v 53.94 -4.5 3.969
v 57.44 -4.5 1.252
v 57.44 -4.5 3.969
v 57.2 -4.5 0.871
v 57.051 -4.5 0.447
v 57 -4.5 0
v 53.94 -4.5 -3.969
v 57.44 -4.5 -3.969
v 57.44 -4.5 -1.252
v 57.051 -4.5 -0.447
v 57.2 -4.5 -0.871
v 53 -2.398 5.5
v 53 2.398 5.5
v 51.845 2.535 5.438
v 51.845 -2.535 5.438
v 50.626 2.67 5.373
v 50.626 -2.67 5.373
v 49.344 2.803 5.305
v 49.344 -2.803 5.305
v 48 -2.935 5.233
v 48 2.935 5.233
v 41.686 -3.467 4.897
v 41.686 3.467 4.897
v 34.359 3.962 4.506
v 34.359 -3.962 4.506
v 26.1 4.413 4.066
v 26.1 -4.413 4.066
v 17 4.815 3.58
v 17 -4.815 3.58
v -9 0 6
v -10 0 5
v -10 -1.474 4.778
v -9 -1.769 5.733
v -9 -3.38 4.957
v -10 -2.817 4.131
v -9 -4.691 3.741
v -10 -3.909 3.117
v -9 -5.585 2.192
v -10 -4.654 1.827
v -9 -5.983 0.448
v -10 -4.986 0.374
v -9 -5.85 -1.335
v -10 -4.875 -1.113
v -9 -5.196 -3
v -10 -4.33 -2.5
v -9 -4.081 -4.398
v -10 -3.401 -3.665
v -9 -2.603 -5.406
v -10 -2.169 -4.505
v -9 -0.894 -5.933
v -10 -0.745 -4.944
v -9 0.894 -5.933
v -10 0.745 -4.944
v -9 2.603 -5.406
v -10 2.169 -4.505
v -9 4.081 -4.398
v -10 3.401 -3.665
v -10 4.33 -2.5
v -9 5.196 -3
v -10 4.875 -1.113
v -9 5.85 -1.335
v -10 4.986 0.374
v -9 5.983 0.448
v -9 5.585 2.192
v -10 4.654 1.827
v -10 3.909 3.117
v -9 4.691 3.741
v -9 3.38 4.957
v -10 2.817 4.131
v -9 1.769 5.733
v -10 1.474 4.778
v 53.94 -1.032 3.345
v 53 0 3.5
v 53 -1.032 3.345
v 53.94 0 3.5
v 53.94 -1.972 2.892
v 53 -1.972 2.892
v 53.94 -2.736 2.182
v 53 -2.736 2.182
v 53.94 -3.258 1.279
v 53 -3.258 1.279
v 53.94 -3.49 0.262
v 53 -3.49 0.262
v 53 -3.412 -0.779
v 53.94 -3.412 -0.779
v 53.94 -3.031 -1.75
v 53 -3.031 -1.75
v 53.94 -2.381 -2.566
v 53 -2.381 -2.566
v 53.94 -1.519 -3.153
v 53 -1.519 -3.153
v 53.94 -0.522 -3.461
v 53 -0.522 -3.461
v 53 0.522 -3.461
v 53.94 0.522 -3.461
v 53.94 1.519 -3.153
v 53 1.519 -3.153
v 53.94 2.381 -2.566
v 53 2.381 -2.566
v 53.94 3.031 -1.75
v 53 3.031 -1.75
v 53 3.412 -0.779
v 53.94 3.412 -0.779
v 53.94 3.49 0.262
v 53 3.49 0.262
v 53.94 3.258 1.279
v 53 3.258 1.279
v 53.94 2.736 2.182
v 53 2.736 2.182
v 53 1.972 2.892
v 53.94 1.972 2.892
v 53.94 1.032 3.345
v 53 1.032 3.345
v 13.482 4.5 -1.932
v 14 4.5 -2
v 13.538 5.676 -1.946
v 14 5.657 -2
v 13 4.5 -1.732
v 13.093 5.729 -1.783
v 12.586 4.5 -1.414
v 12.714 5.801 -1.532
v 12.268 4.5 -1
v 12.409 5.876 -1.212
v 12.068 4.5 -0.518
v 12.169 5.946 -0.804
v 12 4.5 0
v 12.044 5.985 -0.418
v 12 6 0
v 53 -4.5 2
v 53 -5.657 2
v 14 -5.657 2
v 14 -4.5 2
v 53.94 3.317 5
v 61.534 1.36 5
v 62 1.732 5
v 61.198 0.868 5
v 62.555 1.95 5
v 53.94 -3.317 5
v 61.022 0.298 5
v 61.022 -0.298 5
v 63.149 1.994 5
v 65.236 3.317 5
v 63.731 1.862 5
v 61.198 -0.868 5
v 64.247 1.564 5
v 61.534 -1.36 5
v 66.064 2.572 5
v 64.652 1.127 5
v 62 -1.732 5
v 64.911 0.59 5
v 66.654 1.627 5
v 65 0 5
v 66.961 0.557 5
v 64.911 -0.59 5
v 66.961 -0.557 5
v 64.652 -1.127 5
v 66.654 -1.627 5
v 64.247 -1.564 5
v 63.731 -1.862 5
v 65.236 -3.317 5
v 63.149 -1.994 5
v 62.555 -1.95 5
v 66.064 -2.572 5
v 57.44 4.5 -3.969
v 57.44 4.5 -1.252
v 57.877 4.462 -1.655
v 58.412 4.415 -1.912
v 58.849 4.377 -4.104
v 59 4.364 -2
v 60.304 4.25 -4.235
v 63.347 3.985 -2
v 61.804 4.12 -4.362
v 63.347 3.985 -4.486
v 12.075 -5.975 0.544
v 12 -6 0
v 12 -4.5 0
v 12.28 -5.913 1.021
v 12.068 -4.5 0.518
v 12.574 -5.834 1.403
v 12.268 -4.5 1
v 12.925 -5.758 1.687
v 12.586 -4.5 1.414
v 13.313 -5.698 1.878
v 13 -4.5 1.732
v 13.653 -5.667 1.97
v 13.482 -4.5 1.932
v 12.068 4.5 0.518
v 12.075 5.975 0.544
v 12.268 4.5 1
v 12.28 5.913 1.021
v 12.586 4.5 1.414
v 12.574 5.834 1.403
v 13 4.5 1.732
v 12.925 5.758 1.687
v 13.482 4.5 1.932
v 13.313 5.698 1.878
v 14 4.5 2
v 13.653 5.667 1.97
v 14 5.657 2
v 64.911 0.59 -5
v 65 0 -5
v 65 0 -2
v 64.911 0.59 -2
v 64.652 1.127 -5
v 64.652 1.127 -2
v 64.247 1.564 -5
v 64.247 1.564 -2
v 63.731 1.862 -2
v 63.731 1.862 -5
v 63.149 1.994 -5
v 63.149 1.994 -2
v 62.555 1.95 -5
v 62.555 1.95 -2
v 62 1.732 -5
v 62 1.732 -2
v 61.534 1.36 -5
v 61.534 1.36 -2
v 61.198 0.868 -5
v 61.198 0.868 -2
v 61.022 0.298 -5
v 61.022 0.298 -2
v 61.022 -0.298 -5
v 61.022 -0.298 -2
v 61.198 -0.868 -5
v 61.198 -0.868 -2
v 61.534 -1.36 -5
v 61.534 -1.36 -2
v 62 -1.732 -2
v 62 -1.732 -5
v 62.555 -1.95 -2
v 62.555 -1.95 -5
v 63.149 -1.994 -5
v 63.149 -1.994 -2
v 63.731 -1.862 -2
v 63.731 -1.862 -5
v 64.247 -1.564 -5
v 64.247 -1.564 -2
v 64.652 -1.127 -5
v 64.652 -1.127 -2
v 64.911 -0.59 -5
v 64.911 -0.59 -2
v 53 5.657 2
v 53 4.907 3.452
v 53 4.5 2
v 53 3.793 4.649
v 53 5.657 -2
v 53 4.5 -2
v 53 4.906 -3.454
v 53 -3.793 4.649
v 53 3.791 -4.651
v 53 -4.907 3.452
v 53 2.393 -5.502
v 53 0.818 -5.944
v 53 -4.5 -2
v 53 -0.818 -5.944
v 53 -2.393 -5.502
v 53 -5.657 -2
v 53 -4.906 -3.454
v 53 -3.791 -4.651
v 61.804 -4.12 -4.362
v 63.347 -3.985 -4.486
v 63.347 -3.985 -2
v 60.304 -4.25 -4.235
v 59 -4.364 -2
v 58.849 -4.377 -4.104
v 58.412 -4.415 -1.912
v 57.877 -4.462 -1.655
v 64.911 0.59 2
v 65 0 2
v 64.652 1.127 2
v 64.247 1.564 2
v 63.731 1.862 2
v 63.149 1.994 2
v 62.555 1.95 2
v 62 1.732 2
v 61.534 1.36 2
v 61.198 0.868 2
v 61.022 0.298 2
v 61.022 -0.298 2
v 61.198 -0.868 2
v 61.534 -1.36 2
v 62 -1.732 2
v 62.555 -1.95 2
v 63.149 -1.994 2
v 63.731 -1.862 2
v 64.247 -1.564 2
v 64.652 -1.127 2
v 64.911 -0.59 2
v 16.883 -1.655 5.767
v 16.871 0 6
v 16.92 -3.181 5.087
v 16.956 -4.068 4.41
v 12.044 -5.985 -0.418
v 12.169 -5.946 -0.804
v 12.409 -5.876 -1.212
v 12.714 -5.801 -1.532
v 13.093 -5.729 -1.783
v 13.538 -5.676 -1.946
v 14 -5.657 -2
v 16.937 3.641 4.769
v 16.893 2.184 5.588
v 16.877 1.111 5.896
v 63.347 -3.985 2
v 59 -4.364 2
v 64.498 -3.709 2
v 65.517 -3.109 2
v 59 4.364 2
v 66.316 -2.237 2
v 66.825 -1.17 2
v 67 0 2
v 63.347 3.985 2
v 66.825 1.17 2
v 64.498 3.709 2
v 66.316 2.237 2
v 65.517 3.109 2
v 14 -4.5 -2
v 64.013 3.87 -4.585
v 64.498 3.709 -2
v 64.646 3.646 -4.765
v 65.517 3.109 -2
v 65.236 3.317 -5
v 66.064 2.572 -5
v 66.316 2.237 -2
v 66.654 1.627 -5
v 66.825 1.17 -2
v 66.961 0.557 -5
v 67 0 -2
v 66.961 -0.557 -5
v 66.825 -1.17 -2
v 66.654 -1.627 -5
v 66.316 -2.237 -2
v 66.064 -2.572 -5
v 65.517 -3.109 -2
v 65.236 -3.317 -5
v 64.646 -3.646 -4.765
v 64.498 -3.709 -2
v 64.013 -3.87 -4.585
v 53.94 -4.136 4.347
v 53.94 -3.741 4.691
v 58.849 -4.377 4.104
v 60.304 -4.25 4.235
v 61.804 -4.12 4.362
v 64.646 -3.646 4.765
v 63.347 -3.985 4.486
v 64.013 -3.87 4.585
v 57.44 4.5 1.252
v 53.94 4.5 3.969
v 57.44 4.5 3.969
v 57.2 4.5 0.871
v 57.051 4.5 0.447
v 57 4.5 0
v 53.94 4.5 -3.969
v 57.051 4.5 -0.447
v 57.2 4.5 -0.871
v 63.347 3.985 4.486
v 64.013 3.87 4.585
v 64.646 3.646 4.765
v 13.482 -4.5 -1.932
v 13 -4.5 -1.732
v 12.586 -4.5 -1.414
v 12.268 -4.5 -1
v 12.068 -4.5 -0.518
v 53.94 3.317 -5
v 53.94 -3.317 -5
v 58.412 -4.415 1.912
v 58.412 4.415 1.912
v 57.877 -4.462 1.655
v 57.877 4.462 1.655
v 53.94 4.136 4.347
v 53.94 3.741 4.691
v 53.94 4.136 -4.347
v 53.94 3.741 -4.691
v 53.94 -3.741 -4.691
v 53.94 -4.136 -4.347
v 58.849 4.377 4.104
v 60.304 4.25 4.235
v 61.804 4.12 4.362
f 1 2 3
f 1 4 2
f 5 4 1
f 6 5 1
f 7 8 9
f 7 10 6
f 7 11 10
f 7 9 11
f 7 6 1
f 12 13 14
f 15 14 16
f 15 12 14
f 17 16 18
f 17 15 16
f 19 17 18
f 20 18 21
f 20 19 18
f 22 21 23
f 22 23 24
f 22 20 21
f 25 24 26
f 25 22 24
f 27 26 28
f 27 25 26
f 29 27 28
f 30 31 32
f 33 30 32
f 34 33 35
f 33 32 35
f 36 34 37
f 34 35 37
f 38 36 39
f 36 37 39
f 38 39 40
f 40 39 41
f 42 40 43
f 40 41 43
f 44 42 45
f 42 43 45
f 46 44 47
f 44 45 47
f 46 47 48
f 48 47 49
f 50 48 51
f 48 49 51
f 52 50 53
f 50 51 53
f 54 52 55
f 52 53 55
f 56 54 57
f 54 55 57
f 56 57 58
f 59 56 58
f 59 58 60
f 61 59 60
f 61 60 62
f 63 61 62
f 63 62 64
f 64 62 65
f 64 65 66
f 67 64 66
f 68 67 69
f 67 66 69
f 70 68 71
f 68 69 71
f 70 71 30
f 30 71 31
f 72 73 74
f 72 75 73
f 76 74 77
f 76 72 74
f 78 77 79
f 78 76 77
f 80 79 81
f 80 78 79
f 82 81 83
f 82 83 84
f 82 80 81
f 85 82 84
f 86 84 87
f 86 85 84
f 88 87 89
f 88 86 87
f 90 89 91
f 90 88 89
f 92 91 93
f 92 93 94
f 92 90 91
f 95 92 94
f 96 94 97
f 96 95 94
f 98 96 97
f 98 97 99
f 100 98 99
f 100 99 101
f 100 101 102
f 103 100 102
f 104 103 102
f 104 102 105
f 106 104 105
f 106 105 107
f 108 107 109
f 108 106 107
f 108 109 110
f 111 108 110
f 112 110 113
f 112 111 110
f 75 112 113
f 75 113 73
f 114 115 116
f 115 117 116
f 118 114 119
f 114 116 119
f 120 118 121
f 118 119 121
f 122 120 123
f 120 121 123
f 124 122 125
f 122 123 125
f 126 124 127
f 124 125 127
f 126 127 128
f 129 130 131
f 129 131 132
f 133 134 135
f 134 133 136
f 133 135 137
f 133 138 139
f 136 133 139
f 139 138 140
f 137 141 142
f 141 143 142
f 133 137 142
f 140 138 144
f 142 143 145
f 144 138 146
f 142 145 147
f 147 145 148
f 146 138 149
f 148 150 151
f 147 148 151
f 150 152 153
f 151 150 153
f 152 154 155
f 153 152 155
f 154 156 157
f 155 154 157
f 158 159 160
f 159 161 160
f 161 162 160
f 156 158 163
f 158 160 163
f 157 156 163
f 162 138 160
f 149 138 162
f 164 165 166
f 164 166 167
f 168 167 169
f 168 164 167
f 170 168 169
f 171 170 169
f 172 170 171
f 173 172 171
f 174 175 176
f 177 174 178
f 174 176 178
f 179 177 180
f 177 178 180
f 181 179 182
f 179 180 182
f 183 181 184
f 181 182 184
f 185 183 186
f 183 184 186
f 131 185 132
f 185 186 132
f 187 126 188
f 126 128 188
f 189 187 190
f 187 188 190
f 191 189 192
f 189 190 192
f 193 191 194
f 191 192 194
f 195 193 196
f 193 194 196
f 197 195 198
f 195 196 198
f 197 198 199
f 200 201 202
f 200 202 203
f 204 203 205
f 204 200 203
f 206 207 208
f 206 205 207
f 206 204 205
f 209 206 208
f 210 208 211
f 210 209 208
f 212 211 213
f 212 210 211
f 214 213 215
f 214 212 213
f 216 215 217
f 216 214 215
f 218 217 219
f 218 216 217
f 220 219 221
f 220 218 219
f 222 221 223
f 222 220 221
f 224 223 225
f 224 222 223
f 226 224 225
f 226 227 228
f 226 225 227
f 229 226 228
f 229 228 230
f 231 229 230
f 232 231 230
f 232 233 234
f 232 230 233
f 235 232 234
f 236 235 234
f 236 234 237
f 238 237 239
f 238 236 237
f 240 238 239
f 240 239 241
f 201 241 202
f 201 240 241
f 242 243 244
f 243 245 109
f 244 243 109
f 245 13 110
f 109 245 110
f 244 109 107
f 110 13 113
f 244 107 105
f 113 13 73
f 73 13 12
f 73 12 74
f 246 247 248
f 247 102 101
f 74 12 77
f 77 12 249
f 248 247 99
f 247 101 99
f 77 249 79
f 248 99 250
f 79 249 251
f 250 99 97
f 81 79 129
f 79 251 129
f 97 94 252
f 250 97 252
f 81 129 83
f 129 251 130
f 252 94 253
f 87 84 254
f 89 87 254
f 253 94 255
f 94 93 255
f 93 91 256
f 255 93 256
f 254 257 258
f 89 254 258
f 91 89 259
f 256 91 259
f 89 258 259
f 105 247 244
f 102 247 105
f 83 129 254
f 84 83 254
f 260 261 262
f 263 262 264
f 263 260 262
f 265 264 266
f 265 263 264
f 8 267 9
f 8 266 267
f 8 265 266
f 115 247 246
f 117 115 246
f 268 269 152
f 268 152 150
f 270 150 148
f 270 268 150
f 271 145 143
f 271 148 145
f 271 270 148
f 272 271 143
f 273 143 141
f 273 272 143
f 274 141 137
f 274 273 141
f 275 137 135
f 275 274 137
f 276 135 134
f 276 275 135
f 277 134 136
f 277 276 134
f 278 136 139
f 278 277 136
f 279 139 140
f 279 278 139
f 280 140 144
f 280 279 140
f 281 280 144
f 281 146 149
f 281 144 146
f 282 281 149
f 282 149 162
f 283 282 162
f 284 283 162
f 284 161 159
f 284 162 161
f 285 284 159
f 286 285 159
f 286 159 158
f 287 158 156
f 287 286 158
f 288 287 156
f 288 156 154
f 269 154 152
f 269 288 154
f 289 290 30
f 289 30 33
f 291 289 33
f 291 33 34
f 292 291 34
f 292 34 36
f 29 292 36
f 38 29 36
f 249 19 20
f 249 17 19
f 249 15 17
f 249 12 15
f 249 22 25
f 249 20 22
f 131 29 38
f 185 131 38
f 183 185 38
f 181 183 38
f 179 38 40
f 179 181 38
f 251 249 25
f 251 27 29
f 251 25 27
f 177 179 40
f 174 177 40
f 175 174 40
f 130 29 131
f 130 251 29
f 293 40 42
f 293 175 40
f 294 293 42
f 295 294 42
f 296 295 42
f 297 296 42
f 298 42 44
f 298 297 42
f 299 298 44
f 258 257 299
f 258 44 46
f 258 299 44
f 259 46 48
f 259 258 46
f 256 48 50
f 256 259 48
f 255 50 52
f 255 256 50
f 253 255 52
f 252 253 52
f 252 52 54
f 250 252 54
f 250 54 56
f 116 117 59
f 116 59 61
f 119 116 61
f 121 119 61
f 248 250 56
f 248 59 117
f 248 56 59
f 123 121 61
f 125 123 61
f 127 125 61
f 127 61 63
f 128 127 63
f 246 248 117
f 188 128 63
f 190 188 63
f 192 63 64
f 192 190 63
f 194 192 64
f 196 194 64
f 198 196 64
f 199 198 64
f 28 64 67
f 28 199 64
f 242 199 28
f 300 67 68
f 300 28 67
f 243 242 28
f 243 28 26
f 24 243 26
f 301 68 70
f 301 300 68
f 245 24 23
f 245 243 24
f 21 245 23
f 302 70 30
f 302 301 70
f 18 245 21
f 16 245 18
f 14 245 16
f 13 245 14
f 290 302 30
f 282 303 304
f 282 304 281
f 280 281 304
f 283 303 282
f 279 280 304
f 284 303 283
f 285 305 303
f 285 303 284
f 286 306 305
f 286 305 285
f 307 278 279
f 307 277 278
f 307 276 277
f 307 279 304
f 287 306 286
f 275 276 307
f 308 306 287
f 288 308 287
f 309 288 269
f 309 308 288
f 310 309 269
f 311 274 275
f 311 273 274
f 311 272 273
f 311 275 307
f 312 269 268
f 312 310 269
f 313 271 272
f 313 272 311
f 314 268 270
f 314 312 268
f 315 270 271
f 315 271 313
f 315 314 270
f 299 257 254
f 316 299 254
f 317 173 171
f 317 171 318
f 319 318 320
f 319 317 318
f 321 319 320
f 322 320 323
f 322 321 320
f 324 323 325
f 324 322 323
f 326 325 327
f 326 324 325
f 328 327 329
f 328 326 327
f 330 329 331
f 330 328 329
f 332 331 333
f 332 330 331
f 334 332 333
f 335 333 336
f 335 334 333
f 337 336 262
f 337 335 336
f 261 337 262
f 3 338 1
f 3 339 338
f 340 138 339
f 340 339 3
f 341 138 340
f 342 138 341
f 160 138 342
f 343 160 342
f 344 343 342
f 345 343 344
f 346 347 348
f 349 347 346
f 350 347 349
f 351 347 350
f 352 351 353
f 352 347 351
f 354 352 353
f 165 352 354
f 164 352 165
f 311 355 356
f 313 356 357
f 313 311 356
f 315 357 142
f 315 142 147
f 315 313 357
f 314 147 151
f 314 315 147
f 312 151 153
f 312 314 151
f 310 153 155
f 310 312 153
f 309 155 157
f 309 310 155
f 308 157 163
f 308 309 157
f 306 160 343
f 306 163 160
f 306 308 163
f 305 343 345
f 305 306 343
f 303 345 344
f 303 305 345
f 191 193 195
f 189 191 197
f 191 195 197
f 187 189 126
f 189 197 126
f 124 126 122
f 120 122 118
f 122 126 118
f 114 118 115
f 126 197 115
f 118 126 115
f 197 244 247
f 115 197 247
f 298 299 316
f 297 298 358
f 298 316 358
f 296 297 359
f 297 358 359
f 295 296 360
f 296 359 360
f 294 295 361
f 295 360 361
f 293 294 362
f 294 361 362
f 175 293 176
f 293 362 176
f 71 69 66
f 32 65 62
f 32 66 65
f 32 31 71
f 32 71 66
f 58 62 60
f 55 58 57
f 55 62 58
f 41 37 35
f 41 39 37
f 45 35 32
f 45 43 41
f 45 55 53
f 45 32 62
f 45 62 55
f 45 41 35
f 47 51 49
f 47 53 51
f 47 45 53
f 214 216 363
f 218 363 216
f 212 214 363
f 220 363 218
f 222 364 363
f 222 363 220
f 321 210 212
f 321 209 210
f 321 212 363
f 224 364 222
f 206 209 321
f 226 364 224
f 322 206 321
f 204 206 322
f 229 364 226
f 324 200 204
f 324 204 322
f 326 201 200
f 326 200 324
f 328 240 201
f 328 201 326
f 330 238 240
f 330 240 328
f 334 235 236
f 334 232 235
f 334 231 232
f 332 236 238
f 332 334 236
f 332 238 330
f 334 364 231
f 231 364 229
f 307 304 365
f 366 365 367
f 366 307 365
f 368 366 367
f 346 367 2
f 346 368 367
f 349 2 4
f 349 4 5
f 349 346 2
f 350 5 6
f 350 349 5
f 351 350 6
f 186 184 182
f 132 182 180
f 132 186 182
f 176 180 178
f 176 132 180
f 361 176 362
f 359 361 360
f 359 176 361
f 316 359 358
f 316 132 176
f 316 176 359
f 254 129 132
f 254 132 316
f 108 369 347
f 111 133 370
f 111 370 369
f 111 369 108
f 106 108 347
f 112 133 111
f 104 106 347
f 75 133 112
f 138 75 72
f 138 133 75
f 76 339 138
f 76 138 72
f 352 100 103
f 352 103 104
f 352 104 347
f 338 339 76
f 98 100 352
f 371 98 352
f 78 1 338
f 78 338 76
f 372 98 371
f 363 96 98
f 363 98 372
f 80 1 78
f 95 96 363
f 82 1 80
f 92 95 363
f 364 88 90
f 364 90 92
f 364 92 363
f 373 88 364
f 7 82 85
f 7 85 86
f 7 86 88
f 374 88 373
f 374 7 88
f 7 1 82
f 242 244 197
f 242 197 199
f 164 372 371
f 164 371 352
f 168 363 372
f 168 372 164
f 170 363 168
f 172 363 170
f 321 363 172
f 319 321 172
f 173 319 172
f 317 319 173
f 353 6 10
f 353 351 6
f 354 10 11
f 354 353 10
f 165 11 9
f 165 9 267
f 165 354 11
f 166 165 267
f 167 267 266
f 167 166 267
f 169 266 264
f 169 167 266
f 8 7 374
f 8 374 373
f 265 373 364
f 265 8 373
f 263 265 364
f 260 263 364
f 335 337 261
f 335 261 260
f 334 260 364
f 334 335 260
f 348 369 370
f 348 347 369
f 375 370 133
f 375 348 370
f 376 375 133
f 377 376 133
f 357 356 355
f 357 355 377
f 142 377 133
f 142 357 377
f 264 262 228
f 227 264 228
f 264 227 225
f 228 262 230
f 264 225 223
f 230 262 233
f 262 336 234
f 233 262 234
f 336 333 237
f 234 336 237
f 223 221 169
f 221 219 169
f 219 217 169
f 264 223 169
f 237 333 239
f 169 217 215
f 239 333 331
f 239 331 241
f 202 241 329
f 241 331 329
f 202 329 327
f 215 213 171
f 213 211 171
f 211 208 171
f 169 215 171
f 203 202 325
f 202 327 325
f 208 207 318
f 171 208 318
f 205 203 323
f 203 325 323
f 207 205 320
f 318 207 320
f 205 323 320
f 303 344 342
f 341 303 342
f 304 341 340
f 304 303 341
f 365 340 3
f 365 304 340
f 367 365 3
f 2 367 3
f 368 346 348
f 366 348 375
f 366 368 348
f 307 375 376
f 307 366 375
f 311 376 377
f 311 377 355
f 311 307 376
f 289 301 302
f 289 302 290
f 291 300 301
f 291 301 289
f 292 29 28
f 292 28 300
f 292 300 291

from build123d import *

# Parameters (mm, degrees)
SKIZZE1_W                            = 63
SKIZZE1_H                            = 6
SKIZZE2_W                            = 18
SKIZZE2_H                            = 14
AUFSATZ_LINEAR_AUSTRAGEN1_DEPTH      = 9
SCHNITT_LINEAR_AUSTRAGEN1_DEPTH      = 72.909665553
SCHNITT_LINEAR_AUSTRAGEN1_DEPTH_BACK = 72.909665553
SKIZZE3_R                            = 2
SCHNITT_LINEAR_AUSTRAGEN2_DEPTH      = 72.909665553
SCHNITT_LINEAR_AUSTRAGEN2_DEPTH_BACK = 72.909665553
SKIZZE4_W                            = 15
SKIZZE4_H                            = 4
SCHNITT_LINEAR_AUSTRAGEN4_DEPTH      = 72.909665553
SCHNITT_LINEAR_AUSTRAGEN4_DEPTH_BACK = 72.909665553
SCHNITT_LINEAR_AUSTRAGEN5_DEPTH      = 5
SCHNITT_LINEAR_AUSTRAGEN5_DEPTH_BACK = 65.02343321
SKIZZE9_OUTSIDE_W                    = 32.83
SKIZZE9_OUTSIDE_H                    = 36.83
SKIZZE9_OUTSIDE_R                    = 6
SKIZZE11_W                           = 0.94
SKIZZE11_H                           = 2.5
SKIZZE14_W                           = 4
SKIZZE14_H                           = 3
SCHNITT_LINEAR_AUSTRAGEN7_DEPTH      = 45
FASE1_SIZE                           = 1
SCHNITT_LINEAR_START                 = -6.0000001
SCHNITT_LINEAR_AUSTRAGEN8_DEPTH      = 12.0000001
SCHNITT_LINEAR_AUSTRAGEN9_DEPTH      = 68.535176128
SCHNITT_LINEAR_AUSTRAGEN9_DEPTH_BACK = 68.535176128
SKIZZE16_W                           = 13.06
SKIZZE16_H                           = 1
VERRUNDUNG2_R                        = 2
VERRUNDUNG3_R                        = 2
VERRUNDUNG4_R                        = 2


with BuildPart() as part:
    # Skizze1 → Rotation1 (revolve)
    with BuildSketch(Plane.XY, mode=Mode.PRIVATE) as rotation1_sk:
        with Locations((21.5, 3)):
            Rectangle(SKIZZE1_W, SKIZZE1_H)
    revolve(rotation1_sk.sketch.rotate(Axis((0, 0, 0), (1, 0, 0)), 90), axis=Axis((0, 0, 0), (1, 0, 0)))

    # Skizze2 → Aufsatz-Linear austragen1 (add, symmetric)
    with BuildSketch(Plane(origin=(0, 0, 0), x_dir=(1, 0, 0), z_dir=(0, 1, 0))):
        with Locations((62, 0)):
            Rectangle(SKIZZE2_W, SKIZZE2_H)
    extrude(amount=AUFSATZ_LINEAR_AUSTRAGEN1_DEPTH, both=True)

    # Skizze3 → Schnitt-Linear austragen1 (cut, two sides: drawn at the far end of the back side and taken through both)
    with BuildSketch(Plane.XY.offset(-SCHNITT_LINEAR_AUSTRAGEN1_DEPTH_BACK)):
        with Locations((63, 0)):
            Circle(SKIZZE3_R)
    extrude(amount=SCHNITT_LINEAR_AUSTRAGEN1_DEPTH + SCHNITT_LINEAR_AUSTRAGEN1_DEPTH_BACK, mode=Mode.SUBTRACT)

    # Skizze4 → Schnitt-Linear austragen2 (cut, two sides: drawn at the far end of the back side and taken through both)
    with BuildSketch(Plane(origin=(0, 0, 0), x_dir=(1, 0, 0), z_dir=(0, 1, 0)).offset(-SCHNITT_LINEAR_AUSTRAGEN2_DEPTH_BACK)):
        with Locations((64.5, 0)):
            Rectangle(SKIZZE4_W, SKIZZE4_H)
    extrude(amount=SCHNITT_LINEAR_AUSTRAGEN2_DEPTH + SCHNITT_LINEAR_AUSTRAGEN2_DEPTH_BACK, mode=Mode.SUBTRACT)

    # Skizze7 → Schnitt-Linear austragen4 (cut, two sides: drawn at the far end of the back side and taken through both)
    with BuildSketch(Plane(origin=(0, 0, 0), x_dir=(1, 0, 0), z_dir=(0, 1, 0)).offset(-SCHNITT_LINEAR_AUSTRAGEN4_DEPTH_BACK)):
        Polygon((53, -5.5), (17, -3.580275313), (16.870966522, -6), (53, -6), align=None)
    extrude(amount=SCHNITT_LINEAR_AUSTRAGEN4_DEPTH + SCHNITT_LINEAR_AUSTRAGEN4_DEPTH_BACK, mode=Mode.SUBTRACT)

    # Skizze9 outside → Schnitt-Linear austragen5 (cut, two sides: drawn at the far end of the back side and taken through both)
    with BuildSketch(Plane.ZY.offset(-53).offset(-SCHNITT_LINEAR_AUSTRAGEN5_DEPTH_BACK)):
        Rectangle(SKIZZE9_OUTSIDE_W, SKIZZE9_OUTSIDE_H)
        Circle(SKIZZE9_OUTSIDE_R, mode=Mode.SUBTRACT)
    extrude(amount=SCHNITT_LINEAR_AUSTRAGEN5_DEPTH + SCHNITT_LINEAR_AUSTRAGEN5_DEPTH_BACK, mode=Mode.SUBTRACT)

    # Skizze11 → Schnitt-Rotation1 (revolve, cut)
    with BuildSketch(Plane.XY, mode=Mode.PRIVATE) as schnitt_rotation1_sk:
        with Locations((53.47, 4.75)):
            Rectangle(SKIZZE11_W, SKIZZE11_H)
    revolve(schnitt_rotation1_sk.sketch.rotate(Axis((0, 0, 0), (1, 0, 0)), 90), axis=Axis((0, 0, 0), (1, 0, 0)), mode=Mode.SUBTRACT)

    # Skizze14 → Schnitt-Linear austragen7 (cut)
    with BuildSketch(Plane(origin=(57, 0, 0), x_dir=(0, 0, -1), z_dir=(1, 0, 0))):
        with Locations((0, 6)):
            Rectangle(SKIZZE14_W, SKIZZE14_H)
        with Locations((0, -6)):
            Rectangle(SKIZZE14_W, SKIZZE14_H)
    extrude(amount=-SCHNITT_LINEAR_AUSTRAGEN7_DEPTH, mode=Mode.SUBTRACT)

    # Fase1
    fase1_edges = [part.edges().sort_by_distance(p)[0] for p in [
        (-10, 0, -6),
    ]]
    chamfer(fase1_edges, length=FASE1_SIZE)

    # Schnitt-Linear austragen8: read off the stored shape, not the designer's step
    # Schnitt-Linear austragen8 outline → Schnitt-Linear austragen8 (cut)
    with BuildSketch(Plane.XY.offset(SCHNITT_LINEAR_START)):
        with BuildLine():
            Line((53.94, 7), (53.94, 4.5))
            Line((53.94, 4.5), (57.44, 4.5))
            Line((57.44, 4.5), (63.347474122, 3.984879137))
            ThreePointArc((63.347474122, 3.984879137), (67, 0), (63.347474122, -3.984879137))
            Line((63.347474122, -3.984879137), (57.44, -4.5))
            Line((57.44, -4.5), (53.94, -4.5))
            Line((53.94, -4.5), (53.94, -7))
            Line((53.94, -7), (72, -7))
            Line((72, -7), (72, 7))
            Line((72, 7), (53.94, 7))
        make_face()
    extrude(amount=SCHNITT_LINEAR_AUSTRAGEN8_DEPTH, mode=Mode.SUBTRACT)

    # Skizze16 → Schnitt-Linear austragen9 (cut, two sides: drawn at the far end of the back side and taken through both)
    with BuildSketch(Plane(origin=(0, 0, 0), x_dir=(1, 0, 0), z_dir=(0, 1, 0)).offset(-SCHNITT_LINEAR_AUSTRAGEN9_DEPTH_BACK)):
        with Locations((60.47, 5.5)):
            Rectangle(SKIZZE16_W, SKIZZE16_H)
        with Locations((60.47, -5.5)):
            Rectangle(SKIZZE16_W, SKIZZE16_H)
    extrude(amount=SCHNITT_LINEAR_AUSTRAGEN9_DEPTH + SCHNITT_LINEAR_AUSTRAGEN9_DEPTH_BACK, mode=Mode.SUBTRACT)

    # Verrundung2
    verrundung2_edges = [part.edges().sort_by_distance(p)[0] for p in [
        (12, 5.078427125, 2),
        (12, 5.078427125, -2),
    ]]
    fillet(verrundung2_edges, radius=VERRUNDUNG2_R - 0.0001)  # a hair under: the kernel refuses the full size

    # Verrundung3
    verrundung3_edges = [part.edges().sort_by_distance(p)[0] for p in [
        (12, -5.078427125, 2),
        (12, -5.078427125, -2),
    ]]
    fillet(verrundung3_edges, radius=VERRUNDUNG3_R - 0.0001)  # a hair under: the kernel refuses the full size

    # Verrundung4
    verrundung4_edges = [part.edges().sort_by_distance(p)[0] for p in [
        (57, 0, -2),
        (57, 0, 2),
    ]]
    fillet(verrundung4_edges, radius=VERRUNDUNG4_R - 0.0001)  # a hair under: the kernel refuses the full size


solid = part.part
